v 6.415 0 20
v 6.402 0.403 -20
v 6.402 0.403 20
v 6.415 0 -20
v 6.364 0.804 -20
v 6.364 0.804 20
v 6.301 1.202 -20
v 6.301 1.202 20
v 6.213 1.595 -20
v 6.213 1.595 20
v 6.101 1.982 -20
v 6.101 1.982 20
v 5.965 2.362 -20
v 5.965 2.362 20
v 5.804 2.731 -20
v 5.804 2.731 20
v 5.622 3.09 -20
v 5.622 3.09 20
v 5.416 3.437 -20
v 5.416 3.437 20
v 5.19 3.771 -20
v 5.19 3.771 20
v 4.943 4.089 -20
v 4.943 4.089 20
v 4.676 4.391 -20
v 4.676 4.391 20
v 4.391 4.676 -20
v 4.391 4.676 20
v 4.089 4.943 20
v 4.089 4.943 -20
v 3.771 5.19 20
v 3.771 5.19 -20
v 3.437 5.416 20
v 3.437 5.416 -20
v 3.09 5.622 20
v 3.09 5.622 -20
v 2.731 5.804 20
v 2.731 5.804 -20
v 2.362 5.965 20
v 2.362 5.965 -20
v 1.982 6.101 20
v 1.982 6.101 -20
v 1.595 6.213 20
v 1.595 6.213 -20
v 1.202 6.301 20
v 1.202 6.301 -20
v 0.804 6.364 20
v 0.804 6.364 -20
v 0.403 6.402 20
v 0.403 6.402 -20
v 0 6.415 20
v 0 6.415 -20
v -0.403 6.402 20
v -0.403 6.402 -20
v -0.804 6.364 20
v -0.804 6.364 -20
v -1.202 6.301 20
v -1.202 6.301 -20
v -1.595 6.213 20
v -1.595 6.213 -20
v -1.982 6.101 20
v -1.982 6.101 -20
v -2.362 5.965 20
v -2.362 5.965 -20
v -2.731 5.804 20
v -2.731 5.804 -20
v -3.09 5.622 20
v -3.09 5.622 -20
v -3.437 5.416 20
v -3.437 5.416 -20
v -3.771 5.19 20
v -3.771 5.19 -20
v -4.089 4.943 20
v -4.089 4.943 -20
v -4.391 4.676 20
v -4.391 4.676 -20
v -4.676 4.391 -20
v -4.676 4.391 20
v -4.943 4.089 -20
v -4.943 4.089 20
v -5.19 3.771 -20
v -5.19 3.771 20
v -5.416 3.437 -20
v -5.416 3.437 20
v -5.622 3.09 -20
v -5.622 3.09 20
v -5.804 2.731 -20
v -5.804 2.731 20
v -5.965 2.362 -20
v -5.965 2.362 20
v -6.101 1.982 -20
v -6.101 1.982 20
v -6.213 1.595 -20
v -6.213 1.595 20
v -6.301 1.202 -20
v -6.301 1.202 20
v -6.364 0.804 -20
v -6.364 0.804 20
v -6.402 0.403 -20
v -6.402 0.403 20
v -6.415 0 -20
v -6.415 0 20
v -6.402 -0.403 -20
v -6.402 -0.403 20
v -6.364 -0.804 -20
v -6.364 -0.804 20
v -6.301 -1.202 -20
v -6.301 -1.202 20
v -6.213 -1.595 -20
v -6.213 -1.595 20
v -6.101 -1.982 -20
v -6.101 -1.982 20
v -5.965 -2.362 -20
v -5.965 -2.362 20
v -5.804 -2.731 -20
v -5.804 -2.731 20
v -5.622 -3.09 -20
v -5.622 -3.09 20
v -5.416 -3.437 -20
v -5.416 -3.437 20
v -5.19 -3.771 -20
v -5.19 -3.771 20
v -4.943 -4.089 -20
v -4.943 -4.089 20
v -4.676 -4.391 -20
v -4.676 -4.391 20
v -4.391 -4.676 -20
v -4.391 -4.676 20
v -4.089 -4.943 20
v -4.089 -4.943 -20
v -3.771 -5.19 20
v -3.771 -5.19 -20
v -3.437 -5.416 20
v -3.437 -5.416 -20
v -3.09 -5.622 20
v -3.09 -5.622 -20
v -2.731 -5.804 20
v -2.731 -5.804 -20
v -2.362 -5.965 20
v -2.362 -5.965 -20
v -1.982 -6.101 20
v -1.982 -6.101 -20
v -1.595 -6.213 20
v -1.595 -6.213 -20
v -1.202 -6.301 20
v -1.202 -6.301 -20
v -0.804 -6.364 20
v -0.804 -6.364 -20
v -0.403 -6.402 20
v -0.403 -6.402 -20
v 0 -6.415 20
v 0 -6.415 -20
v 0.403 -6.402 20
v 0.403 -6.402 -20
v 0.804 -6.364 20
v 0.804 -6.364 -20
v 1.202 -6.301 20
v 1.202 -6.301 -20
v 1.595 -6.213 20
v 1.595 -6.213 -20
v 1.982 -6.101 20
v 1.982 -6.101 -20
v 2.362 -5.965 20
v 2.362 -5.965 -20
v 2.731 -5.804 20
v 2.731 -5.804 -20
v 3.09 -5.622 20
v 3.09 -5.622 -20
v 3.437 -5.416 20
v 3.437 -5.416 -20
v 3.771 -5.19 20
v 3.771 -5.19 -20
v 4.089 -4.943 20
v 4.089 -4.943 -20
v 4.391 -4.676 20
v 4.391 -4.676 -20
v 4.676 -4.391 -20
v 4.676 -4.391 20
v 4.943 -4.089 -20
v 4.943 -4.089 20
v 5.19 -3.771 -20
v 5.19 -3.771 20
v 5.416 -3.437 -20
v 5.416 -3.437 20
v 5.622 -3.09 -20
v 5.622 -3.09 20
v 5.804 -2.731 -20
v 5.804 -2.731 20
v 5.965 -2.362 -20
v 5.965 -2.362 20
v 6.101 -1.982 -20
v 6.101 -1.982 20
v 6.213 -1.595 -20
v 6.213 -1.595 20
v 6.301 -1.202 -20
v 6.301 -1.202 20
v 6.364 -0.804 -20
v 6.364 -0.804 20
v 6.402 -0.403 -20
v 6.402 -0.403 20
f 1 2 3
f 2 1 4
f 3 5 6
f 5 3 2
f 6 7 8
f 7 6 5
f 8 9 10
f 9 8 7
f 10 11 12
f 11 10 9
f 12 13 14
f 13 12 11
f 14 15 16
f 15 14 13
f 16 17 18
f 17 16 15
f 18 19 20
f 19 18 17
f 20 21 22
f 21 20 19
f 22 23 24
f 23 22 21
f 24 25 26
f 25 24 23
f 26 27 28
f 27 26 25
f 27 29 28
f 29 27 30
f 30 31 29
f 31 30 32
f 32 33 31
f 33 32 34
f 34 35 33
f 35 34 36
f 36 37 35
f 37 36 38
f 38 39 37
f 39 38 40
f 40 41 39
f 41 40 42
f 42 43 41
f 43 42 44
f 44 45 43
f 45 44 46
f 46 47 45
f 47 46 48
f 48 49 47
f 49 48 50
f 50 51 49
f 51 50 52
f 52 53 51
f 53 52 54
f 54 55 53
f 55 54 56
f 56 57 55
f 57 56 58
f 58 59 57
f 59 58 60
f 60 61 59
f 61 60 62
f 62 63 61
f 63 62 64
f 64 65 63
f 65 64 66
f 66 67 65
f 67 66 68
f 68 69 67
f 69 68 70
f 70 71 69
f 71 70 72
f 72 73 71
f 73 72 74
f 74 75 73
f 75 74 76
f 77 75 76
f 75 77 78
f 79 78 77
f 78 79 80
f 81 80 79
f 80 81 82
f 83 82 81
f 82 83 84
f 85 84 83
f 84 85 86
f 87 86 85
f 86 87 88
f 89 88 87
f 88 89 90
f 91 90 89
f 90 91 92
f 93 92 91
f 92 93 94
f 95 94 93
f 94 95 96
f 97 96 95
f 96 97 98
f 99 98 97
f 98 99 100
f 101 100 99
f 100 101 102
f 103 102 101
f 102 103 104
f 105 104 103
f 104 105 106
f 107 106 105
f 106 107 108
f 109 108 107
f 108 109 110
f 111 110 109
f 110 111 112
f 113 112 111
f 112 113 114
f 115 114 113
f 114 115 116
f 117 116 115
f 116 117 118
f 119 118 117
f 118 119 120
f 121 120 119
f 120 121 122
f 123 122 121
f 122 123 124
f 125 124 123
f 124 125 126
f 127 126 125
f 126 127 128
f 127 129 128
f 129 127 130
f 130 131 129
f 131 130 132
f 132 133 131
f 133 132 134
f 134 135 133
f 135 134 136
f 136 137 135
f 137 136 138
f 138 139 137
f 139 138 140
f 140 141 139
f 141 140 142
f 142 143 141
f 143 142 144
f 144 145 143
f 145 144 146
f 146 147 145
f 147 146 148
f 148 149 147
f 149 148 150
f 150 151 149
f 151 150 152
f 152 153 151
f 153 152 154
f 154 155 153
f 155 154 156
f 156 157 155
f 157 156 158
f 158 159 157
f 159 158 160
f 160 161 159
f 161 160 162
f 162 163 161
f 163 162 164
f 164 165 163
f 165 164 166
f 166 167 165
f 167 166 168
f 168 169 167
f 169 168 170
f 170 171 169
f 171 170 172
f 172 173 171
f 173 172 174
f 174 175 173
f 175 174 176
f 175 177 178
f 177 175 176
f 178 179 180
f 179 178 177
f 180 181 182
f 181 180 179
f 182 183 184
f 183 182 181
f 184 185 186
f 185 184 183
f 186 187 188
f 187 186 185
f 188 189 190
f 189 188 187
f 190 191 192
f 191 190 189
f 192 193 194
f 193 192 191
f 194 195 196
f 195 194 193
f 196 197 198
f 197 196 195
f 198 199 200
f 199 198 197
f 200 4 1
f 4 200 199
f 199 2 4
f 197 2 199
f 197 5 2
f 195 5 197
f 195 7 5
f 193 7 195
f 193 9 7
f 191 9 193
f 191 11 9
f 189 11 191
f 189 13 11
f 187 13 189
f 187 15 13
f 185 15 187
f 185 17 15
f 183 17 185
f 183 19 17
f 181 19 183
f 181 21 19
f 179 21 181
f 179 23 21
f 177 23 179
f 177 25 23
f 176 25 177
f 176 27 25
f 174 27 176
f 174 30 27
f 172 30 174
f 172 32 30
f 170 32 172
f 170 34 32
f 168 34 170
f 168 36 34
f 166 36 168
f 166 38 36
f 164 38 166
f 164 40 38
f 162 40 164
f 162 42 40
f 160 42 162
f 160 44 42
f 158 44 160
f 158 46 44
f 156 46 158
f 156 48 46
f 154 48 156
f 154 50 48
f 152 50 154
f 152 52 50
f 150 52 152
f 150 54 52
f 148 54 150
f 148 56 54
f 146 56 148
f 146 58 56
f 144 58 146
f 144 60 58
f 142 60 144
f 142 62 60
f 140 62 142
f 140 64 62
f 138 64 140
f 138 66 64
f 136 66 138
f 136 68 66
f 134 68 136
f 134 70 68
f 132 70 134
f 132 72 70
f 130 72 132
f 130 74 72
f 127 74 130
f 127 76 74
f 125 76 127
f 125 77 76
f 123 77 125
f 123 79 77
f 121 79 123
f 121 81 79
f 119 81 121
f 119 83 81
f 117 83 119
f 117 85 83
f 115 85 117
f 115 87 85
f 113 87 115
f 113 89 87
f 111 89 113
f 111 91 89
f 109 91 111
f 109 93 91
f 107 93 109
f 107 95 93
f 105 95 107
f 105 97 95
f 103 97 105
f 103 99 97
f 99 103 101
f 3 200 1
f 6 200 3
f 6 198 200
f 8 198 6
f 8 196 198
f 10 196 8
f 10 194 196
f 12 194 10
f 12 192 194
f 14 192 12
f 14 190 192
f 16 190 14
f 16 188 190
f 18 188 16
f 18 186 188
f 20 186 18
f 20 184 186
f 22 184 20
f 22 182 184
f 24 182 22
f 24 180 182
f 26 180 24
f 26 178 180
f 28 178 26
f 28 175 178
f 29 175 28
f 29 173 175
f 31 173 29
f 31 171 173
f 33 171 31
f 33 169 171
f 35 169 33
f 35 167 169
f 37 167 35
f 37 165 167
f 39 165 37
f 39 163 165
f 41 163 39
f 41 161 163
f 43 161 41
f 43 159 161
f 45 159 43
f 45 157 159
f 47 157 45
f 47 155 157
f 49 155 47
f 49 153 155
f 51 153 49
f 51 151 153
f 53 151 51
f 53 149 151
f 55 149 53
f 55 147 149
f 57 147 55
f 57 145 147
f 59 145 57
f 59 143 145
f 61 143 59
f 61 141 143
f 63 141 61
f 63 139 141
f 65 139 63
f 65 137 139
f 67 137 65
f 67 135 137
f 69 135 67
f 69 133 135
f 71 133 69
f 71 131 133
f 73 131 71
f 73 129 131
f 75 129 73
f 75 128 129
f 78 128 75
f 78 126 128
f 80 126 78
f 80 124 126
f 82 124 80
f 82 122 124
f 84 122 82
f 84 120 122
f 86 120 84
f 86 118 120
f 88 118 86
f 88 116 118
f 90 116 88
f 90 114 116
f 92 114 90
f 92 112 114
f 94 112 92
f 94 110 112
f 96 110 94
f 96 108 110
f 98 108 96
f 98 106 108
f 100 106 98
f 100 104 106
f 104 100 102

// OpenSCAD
buttonAssetThrow();


module buttonAssetThrow(
    z_size = 40,
    diameter_correction = 1,
    _fn = 100
) {
    
    diameter = 11.83 + diameter_correction;

    cylinder(
        d = diameter,
        h = z_size,
        center = true,
        $fn = _fn
    );

}
